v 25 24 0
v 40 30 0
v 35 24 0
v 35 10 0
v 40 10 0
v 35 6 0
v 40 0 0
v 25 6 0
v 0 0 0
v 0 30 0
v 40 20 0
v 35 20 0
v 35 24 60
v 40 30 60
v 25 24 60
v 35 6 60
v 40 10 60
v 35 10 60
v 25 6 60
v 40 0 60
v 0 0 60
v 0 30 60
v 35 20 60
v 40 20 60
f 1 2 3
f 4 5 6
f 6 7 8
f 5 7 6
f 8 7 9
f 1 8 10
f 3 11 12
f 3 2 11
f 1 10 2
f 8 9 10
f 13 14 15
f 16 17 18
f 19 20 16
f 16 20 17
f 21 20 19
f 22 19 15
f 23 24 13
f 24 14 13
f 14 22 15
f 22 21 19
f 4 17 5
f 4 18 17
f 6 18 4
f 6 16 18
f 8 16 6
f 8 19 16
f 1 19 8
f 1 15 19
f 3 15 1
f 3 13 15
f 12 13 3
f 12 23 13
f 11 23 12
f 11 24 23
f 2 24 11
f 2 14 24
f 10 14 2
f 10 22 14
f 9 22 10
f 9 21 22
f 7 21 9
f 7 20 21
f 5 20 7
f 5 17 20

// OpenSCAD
$fn = 32;

// ----------------------------------------------------------------------
// T-slot rail: 40 x 30 mm section, 60 mm long
// ----------------------------------------------------------------------

// --- parameters (mm) ---
profile_height = 60;      // extrusion height
profile_points = 12;      // points of the closed outline

profile = [[0, 0], [40, 0], [40, 10], [35, 10], [35, 6], [25, 6], [25, 24], [35, 24], [35, 20], [40, 20], [40, 30], [0, 30]];  // single closed polygon, 12 points, counter clockwise

// --- the one profile operation ---
linear_extrude(height = profile_height) polygon(points = profile);
